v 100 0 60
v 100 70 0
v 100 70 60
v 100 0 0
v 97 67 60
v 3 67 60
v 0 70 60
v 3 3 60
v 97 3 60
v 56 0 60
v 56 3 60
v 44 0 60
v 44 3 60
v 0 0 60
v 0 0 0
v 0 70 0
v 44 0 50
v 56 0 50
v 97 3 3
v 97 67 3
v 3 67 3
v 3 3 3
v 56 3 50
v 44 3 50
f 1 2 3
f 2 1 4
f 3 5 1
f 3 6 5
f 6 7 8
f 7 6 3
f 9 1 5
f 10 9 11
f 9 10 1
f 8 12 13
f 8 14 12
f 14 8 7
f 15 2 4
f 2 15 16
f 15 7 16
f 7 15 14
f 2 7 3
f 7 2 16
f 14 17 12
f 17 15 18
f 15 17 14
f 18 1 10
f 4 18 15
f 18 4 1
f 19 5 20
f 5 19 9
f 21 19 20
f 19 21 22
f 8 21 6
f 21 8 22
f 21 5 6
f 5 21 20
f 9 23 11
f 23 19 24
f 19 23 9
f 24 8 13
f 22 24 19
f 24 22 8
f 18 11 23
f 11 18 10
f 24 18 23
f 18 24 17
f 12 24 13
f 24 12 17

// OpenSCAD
$fn = 32;

// ----------------------------------------------------------------------
// Enclosure box: notch enclosure
// ----------------------------------------------------------------------

// --- parameters (mm) ---
box_l = 100;              // outer length, X
box_w = 70;               // outer width, Y
box_h = 60;               // outer height
wall_t = 3;               // wall thickness
notch_w = 12;             // cable notch width
notch_h = 10;             // cable notch height

inner_h = box_h - wall_t;  // cavity depth
boss_h = inner_h - 2;  // corner boss height

difference() {
  cube([box_l, box_w, box_h]);
  translate([wall_t, wall_t, wall_t])
    cube([box_l - 2 * wall_t, box_w - 2 * wall_t, box_h]);
  translate([box_l / 2 - notch_w / 2, -1, box_h - notch_h])
    cube([notch_w, wall_t + 2, notch_h + 1]);
}
